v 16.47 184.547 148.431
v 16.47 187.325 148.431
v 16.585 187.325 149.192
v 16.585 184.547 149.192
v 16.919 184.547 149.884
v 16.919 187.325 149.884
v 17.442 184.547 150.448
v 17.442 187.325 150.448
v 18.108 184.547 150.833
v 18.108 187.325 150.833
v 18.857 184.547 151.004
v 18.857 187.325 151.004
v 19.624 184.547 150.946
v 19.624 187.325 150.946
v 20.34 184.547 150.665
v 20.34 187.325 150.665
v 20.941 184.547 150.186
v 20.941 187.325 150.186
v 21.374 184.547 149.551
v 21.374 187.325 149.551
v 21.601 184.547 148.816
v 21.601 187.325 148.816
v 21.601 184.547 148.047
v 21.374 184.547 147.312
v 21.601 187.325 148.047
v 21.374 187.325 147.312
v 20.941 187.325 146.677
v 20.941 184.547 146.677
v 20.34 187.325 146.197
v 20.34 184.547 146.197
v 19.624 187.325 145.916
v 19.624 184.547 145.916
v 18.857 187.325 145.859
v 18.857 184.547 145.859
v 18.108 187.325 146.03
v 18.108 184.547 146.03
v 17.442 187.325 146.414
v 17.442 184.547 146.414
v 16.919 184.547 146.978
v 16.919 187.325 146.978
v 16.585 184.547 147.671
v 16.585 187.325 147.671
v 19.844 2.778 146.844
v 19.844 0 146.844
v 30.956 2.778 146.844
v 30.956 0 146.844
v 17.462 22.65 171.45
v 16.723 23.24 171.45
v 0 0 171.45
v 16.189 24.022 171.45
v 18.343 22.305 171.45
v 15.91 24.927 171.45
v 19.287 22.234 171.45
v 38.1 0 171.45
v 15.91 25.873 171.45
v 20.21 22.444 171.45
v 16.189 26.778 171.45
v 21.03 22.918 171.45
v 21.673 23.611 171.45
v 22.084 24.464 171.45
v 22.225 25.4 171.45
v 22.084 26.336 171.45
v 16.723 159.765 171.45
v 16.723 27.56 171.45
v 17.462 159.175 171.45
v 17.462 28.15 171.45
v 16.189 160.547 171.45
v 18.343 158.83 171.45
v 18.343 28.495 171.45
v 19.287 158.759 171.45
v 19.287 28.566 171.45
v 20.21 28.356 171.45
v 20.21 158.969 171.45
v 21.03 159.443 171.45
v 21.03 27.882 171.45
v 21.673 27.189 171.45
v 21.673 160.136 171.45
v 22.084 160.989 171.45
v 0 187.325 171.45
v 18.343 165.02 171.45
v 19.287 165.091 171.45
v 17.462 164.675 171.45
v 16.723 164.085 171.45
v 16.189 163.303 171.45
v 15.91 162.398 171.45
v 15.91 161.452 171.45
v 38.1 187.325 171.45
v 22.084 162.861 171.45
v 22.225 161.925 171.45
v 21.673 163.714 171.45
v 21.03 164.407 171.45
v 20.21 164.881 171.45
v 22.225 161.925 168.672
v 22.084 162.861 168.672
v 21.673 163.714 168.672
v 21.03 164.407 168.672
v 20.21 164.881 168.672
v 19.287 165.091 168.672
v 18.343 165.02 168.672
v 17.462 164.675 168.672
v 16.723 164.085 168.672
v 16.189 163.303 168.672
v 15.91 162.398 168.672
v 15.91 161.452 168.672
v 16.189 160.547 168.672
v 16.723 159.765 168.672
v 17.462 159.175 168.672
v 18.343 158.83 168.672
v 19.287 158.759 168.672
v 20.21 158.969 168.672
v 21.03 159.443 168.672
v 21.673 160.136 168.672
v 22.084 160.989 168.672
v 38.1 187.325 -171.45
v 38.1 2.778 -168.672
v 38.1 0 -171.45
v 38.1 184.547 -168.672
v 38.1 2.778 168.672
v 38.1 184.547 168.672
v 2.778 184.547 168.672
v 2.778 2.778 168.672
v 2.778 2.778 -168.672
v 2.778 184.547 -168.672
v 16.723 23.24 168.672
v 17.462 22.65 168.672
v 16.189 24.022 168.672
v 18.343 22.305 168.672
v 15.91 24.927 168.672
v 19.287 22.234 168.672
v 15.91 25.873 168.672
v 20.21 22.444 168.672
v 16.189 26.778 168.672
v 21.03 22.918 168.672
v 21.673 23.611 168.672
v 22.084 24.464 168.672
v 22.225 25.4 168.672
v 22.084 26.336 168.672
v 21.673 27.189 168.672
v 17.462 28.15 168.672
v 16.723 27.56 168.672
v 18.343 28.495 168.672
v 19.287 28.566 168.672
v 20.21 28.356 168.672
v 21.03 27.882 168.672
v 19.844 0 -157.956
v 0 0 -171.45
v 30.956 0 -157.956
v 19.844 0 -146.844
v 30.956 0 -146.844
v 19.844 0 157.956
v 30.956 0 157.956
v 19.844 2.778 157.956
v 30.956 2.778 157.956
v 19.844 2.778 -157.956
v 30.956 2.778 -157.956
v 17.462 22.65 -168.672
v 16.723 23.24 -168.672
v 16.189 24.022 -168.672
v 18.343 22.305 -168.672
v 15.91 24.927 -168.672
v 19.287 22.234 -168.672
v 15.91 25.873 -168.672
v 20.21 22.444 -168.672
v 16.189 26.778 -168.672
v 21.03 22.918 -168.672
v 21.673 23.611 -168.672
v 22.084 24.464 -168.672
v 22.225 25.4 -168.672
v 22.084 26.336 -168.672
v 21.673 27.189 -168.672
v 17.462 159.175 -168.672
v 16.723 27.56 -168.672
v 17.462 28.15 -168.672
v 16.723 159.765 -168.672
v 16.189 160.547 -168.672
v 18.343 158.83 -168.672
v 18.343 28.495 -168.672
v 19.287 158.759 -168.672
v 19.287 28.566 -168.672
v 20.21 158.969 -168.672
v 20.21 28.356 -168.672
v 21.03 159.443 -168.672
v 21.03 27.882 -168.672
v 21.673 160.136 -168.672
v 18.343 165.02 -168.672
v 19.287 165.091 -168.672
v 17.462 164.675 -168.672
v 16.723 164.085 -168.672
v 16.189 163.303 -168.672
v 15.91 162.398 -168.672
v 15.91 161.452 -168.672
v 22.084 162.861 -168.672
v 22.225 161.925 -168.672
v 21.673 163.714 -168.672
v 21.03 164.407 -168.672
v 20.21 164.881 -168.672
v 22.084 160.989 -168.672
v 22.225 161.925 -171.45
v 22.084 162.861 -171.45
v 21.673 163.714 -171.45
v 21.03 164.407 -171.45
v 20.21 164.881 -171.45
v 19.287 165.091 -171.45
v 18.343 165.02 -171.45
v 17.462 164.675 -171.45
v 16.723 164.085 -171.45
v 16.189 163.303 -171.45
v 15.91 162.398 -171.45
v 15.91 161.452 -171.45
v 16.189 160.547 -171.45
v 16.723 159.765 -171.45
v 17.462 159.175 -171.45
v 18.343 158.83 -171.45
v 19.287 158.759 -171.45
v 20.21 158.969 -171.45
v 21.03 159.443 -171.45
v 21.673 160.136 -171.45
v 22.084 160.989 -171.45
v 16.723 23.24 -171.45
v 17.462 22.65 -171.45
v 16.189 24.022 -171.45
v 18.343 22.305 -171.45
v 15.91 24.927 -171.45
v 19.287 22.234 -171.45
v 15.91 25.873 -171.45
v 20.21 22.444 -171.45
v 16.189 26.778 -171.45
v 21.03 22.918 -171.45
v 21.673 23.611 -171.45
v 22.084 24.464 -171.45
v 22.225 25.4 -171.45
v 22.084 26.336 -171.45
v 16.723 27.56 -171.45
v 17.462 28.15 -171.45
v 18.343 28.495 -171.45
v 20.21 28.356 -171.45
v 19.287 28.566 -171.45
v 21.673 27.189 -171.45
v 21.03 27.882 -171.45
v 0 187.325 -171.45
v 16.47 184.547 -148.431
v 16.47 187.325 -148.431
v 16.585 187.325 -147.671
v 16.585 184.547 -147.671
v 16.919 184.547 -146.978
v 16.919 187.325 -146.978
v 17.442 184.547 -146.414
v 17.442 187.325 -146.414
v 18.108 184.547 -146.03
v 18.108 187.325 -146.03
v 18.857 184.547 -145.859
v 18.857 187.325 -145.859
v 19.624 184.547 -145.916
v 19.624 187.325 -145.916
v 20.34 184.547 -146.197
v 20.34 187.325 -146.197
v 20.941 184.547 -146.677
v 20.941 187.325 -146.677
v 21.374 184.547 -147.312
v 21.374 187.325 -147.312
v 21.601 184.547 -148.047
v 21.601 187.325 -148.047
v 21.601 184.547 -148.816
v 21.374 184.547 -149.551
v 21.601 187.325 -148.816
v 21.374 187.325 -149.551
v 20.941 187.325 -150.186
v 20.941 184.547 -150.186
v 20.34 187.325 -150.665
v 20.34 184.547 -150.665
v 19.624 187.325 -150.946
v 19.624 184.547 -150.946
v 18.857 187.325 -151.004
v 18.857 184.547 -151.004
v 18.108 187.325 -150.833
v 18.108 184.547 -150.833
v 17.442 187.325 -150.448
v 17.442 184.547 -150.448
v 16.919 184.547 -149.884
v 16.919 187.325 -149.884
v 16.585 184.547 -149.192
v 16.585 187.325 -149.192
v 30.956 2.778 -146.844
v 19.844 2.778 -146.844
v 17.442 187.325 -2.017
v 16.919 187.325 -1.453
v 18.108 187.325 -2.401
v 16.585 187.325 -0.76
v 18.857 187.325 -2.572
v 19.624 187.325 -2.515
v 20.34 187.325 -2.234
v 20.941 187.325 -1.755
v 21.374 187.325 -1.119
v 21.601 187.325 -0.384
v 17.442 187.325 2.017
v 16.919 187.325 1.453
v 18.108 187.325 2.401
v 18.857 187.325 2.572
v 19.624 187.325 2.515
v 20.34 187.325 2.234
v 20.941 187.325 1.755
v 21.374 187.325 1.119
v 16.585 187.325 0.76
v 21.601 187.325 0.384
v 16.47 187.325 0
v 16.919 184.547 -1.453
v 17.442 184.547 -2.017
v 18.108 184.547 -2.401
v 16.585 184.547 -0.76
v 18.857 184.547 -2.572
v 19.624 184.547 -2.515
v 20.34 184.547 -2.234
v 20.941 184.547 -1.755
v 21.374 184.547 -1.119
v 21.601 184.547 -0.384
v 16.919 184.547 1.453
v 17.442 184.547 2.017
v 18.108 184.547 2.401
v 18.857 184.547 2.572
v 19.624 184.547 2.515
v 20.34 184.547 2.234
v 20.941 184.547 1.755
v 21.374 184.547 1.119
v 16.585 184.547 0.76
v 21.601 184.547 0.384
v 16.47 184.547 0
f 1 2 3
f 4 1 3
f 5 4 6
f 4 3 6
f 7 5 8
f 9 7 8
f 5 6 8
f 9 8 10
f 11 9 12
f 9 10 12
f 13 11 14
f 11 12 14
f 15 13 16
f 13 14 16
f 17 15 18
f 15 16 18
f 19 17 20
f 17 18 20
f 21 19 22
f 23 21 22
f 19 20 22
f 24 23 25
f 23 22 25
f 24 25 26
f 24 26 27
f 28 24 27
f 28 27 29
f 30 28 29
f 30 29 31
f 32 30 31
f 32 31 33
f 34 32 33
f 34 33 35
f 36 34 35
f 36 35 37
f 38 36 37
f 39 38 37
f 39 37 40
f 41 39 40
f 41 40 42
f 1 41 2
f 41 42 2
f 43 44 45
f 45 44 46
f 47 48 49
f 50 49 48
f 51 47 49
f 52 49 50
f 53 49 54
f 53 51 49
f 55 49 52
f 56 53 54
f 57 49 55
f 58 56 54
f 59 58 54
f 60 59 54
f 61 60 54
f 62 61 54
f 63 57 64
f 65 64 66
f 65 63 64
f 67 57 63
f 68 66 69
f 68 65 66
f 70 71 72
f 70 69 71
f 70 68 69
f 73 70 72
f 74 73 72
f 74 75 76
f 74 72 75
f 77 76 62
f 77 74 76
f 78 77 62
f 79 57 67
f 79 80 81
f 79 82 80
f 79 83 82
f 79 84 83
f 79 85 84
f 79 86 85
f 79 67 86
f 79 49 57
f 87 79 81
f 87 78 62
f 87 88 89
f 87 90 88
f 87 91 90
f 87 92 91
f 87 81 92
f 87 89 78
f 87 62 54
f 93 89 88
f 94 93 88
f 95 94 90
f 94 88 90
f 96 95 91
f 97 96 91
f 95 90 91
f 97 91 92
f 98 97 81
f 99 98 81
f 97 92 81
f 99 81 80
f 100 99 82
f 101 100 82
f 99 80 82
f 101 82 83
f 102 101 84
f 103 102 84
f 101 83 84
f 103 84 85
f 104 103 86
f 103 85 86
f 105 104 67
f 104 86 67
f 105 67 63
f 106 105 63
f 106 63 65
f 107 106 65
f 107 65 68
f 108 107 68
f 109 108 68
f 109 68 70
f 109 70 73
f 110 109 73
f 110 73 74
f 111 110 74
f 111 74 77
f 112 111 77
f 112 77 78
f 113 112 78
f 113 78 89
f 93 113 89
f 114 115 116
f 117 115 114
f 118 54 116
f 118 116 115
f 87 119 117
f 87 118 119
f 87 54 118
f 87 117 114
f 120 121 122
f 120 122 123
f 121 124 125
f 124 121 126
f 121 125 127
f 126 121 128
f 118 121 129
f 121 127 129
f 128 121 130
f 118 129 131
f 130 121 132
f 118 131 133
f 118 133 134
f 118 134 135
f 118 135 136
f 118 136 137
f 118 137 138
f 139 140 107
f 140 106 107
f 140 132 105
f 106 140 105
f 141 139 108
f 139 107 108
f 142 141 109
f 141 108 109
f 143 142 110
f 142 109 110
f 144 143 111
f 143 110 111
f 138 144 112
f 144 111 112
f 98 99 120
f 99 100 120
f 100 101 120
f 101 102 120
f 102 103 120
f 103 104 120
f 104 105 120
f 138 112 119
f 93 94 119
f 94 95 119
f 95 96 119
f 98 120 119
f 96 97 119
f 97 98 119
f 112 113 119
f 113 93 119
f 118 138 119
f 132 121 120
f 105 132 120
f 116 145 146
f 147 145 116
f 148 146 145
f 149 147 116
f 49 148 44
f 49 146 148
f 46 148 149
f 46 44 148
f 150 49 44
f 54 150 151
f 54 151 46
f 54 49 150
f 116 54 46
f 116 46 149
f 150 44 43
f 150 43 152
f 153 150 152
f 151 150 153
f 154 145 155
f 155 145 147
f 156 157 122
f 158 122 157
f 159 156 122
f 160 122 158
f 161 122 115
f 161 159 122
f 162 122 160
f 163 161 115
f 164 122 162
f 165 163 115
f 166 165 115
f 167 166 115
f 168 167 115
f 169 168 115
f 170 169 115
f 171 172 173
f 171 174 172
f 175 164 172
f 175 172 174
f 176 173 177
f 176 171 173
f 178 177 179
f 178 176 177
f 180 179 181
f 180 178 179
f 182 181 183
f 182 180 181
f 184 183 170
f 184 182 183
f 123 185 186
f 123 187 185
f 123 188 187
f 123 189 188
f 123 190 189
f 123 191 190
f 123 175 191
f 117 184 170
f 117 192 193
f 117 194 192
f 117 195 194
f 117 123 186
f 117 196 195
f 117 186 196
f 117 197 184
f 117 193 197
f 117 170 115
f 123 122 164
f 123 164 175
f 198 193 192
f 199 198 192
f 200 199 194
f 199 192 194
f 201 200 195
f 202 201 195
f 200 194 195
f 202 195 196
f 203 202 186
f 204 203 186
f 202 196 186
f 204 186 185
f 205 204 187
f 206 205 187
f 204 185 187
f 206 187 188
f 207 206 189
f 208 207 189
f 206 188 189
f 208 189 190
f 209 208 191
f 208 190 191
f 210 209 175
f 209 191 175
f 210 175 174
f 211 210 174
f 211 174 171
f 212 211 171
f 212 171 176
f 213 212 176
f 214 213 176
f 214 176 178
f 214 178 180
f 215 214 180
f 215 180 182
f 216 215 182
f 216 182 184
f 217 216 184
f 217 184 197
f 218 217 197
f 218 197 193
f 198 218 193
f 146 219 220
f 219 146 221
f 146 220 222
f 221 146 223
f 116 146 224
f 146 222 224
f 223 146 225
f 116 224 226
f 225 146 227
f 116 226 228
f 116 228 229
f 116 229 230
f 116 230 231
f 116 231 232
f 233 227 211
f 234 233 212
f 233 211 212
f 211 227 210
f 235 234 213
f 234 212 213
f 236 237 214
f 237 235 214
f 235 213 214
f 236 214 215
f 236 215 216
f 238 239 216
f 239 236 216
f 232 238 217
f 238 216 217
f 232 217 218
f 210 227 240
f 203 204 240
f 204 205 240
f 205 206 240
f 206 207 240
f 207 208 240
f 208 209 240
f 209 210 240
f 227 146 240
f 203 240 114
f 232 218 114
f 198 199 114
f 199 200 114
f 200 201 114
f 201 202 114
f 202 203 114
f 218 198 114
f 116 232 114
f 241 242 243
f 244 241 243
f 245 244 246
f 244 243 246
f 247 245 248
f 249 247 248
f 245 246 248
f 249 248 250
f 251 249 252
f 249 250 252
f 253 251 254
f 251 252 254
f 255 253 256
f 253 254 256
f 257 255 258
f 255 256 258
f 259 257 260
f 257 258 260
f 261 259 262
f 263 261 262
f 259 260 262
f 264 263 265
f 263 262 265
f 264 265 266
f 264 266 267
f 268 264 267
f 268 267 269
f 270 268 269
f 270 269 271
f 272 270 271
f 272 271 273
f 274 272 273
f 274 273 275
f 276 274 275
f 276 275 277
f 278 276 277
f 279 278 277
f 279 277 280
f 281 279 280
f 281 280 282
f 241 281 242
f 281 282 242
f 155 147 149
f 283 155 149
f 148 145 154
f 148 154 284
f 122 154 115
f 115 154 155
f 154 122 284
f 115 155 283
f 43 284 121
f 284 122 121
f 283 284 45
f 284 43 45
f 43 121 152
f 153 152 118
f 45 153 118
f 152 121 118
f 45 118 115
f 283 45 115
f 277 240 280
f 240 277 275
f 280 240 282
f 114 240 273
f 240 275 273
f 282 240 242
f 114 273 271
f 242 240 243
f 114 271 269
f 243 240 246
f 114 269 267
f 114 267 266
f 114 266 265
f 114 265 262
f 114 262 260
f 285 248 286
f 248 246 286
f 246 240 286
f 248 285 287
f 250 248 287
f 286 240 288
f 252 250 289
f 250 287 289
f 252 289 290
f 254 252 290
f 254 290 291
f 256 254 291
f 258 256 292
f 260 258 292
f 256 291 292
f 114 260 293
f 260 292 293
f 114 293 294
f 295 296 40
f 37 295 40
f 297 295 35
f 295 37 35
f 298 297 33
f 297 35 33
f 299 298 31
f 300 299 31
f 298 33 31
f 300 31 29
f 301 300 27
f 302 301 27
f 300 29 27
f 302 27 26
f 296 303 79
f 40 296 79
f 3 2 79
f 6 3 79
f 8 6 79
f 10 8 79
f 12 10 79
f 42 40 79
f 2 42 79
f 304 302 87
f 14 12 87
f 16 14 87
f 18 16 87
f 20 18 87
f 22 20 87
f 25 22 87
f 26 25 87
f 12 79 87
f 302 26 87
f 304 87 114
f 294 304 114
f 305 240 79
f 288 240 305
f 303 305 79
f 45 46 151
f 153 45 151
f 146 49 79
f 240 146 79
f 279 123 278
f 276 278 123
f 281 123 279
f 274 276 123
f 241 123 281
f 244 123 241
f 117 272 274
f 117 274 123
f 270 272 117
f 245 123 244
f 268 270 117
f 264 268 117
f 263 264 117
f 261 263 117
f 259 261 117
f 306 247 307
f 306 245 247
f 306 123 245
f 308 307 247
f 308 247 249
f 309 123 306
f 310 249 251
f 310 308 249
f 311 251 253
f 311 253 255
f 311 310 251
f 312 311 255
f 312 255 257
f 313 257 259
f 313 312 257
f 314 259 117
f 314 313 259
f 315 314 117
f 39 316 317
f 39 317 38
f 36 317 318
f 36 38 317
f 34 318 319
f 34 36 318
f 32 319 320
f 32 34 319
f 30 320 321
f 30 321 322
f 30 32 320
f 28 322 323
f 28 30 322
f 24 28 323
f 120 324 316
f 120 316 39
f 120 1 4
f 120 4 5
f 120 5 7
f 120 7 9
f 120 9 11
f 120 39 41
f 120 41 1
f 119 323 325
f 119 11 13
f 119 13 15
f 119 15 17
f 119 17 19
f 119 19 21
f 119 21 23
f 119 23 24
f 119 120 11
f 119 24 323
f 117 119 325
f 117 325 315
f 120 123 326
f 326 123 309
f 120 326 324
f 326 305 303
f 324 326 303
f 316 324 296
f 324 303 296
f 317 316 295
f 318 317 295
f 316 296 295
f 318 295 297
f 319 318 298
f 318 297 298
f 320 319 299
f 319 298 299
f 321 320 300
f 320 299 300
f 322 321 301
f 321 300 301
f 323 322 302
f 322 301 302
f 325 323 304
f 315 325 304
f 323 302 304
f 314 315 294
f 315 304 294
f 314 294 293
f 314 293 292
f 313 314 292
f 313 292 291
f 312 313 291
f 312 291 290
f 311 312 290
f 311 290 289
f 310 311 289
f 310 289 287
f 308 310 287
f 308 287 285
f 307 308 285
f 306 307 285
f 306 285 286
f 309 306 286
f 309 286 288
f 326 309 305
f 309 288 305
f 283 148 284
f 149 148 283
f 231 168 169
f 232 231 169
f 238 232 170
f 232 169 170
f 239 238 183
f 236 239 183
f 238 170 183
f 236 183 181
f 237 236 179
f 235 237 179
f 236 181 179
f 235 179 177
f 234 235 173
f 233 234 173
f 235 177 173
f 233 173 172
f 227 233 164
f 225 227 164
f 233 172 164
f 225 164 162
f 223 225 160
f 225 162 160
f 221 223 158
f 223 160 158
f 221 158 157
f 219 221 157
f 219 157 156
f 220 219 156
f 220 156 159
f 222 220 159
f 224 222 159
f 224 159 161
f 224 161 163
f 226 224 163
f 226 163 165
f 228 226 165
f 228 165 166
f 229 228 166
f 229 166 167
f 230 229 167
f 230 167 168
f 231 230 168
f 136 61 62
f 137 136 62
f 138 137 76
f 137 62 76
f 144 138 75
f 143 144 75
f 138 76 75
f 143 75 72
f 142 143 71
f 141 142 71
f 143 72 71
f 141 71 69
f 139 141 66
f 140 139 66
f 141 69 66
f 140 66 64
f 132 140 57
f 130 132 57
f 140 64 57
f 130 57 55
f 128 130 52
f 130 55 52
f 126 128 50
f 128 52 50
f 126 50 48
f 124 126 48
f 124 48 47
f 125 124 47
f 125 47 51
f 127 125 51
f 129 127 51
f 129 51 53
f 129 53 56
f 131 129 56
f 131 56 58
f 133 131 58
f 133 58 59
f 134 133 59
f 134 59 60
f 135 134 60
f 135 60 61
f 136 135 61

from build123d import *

# Parameters (mm, degrees)
F0_W     = 38.1
F0_H     = 187.325
F1_DEPTH = 171.45
F2_T     = -2.778125
F3_R     = 2.5796875
F4_DEPTH = 2.778125
F5_R     = 3.175
F6_DEPTH = 342.901
F7_W     = 11.1125
F7_H     = 11.1125
F8_DEPTH = 2.778125


# Not quite as in the source:
# - a feature names something its author has since deleted; it is built from what else it names


with BuildPart() as f1:
    # F0 (on Top) → F1 (new body, symmetric)
    with BuildSketch(Plane.XY):
        with Locations((19.05, 93.6625)):
            Rectangle(F0_W, F0_H)
    extrude(amount=F1_DEPTH, both=True)

    # F2
    f2_openings = [f1.faces().sort_by_distance(p)[0] for p in [
        (38.1, 93.6625, 0),
    ]]
    offset(amount=F2_T, openings=f2_openings)

    # F3 (on face) → F4 (cut, through all)
    with BuildSketch(Plane(origin=(0, 187.325, 0), x_dir=(-1, 0, 0), z_dir=(0, 1, 0))):
        with Locations((-19.05, 148.43125)):
            Circle(F3_R)
        with Locations((-19.05, 0)):
            Circle(F3_R)
        with Locations((-19.05, -148.43125)):
            Circle(F3_R)
    extrude(amount=-F4_DEPTH, mode=Mode.SUBTRACT)

    # F5 (on face) → F6 (cut, through all)
    with BuildSketch(Plane.XY.offset(171.45)):
        with Locations((19.05, 161.925)):
            Circle(F5_R)
        with Locations((19.05, 25.4)):
            Circle(F5_R)
    extrude(amount=-F6_DEPTH, mode=Mode.SUBTRACT)

    # F7 (on face) → F8 (cut, through all)
    with BuildSketch(Plane.XZ):
        with Locations((25.4, 152.4)):
            Rectangle(F7_W, F7_H)
        with Locations((25.4, -152.4)):
            Rectangle(F7_W, F7_H)
    extrude(amount=-F8_DEPTH, mode=Mode.SUBTRACT)


solid = f1.part
